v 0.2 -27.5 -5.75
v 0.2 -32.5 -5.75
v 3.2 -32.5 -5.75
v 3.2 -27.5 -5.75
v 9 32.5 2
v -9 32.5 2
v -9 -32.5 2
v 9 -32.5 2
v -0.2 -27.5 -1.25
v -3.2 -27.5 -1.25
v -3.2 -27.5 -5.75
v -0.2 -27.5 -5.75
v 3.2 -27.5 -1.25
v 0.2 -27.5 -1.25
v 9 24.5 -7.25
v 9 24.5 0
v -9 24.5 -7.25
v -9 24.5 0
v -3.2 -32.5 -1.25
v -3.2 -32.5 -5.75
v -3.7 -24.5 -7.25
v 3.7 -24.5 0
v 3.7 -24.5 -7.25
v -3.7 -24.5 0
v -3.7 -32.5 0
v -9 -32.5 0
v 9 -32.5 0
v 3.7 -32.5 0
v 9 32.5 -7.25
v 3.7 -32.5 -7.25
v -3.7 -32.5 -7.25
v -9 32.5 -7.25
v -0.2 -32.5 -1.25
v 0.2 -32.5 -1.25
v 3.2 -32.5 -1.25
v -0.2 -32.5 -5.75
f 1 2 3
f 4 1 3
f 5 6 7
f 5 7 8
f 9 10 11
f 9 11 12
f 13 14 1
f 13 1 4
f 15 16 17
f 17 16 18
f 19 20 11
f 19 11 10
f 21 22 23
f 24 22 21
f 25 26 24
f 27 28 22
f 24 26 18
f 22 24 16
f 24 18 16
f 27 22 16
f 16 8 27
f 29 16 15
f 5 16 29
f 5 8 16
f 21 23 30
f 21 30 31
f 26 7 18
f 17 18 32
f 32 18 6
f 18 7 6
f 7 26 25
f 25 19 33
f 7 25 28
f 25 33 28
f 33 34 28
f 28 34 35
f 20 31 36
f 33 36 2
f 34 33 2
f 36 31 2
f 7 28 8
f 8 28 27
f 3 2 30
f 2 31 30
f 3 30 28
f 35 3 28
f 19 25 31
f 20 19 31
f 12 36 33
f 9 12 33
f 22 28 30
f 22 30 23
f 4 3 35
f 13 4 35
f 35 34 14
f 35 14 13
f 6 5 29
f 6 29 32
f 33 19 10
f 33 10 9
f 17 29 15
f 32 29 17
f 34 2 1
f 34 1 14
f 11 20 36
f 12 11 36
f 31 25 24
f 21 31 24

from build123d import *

# Parameters (mm, degrees)
BASIC_SHAPE_SKETCH_W     = 18
BASIC_SHAPE_SKETCH_H     = 65
BASIC_SHAPE_DEPTH        = 2
CONNECTOR_SKETCH_W       = 7.4
CONNECTOR_SKETCH_H       = 8
CONNECTOR_DEPTH          = 7.25
CONNECTOR_HOLES_SKETCH_W = 3
CONNECTOR_HOLES_SKETCH_H = 4.5
CONNECTOR_HOLES_DEPTH    = 5
SKETCH1_W                = 18
SKETCH1_H                = 8
BOSS_EXTRUDE1_DEPTH      = 7.25


with BuildPart() as part:
    # Basic Shape Sketch → Basic Shape (new body)
    with BuildSketch(Plane.XY):
        Rectangle(BASIC_SHAPE_SKETCH_W, BASIC_SHAPE_SKETCH_H)
    extrude(amount=BASIC_SHAPE_DEPTH)

    # Connector Sketch → Connector (add)
    with BuildSketch(Plane(origin=(0, 0, 0), x_dir=(-1, 0, 0), z_dir=(0, 0, -1))):
        with Locations((0, -28.5)):
            Rectangle(CONNECTOR_SKETCH_W, CONNECTOR_SKETCH_H)
    extrude(amount=CONNECTOR_DEPTH)

    # Connector Holes Sketch → Connector Holes (cut)
    with BuildSketch(Plane.XZ.offset(32.5)):
        with Locations((-1.7, -3.5)):
            Rectangle(CONNECTOR_HOLES_SKETCH_W, CONNECTOR_HOLES_SKETCH_H)
        with Locations((1.7, -3.5)):
            Rectangle(CONNECTOR_HOLES_SKETCH_W, CONNECTOR_HOLES_SKETCH_H)
    extrude(amount=-CONNECTOR_HOLES_DEPTH, mode=Mode.SUBTRACT)

    # Sketch1 → Boss-Extrude1 (add)
    with BuildSketch(Plane(origin=(0, 0, 0), x_dir=(-1, 0, 0), z_dir=(0, 0, -1))):
        with Locations((0, 28.5)):
            Rectangle(SKETCH1_W, SKETCH1_H)
    extrude(amount=BOSS_EXTRUDE1_DEPTH)


solid = part.part
